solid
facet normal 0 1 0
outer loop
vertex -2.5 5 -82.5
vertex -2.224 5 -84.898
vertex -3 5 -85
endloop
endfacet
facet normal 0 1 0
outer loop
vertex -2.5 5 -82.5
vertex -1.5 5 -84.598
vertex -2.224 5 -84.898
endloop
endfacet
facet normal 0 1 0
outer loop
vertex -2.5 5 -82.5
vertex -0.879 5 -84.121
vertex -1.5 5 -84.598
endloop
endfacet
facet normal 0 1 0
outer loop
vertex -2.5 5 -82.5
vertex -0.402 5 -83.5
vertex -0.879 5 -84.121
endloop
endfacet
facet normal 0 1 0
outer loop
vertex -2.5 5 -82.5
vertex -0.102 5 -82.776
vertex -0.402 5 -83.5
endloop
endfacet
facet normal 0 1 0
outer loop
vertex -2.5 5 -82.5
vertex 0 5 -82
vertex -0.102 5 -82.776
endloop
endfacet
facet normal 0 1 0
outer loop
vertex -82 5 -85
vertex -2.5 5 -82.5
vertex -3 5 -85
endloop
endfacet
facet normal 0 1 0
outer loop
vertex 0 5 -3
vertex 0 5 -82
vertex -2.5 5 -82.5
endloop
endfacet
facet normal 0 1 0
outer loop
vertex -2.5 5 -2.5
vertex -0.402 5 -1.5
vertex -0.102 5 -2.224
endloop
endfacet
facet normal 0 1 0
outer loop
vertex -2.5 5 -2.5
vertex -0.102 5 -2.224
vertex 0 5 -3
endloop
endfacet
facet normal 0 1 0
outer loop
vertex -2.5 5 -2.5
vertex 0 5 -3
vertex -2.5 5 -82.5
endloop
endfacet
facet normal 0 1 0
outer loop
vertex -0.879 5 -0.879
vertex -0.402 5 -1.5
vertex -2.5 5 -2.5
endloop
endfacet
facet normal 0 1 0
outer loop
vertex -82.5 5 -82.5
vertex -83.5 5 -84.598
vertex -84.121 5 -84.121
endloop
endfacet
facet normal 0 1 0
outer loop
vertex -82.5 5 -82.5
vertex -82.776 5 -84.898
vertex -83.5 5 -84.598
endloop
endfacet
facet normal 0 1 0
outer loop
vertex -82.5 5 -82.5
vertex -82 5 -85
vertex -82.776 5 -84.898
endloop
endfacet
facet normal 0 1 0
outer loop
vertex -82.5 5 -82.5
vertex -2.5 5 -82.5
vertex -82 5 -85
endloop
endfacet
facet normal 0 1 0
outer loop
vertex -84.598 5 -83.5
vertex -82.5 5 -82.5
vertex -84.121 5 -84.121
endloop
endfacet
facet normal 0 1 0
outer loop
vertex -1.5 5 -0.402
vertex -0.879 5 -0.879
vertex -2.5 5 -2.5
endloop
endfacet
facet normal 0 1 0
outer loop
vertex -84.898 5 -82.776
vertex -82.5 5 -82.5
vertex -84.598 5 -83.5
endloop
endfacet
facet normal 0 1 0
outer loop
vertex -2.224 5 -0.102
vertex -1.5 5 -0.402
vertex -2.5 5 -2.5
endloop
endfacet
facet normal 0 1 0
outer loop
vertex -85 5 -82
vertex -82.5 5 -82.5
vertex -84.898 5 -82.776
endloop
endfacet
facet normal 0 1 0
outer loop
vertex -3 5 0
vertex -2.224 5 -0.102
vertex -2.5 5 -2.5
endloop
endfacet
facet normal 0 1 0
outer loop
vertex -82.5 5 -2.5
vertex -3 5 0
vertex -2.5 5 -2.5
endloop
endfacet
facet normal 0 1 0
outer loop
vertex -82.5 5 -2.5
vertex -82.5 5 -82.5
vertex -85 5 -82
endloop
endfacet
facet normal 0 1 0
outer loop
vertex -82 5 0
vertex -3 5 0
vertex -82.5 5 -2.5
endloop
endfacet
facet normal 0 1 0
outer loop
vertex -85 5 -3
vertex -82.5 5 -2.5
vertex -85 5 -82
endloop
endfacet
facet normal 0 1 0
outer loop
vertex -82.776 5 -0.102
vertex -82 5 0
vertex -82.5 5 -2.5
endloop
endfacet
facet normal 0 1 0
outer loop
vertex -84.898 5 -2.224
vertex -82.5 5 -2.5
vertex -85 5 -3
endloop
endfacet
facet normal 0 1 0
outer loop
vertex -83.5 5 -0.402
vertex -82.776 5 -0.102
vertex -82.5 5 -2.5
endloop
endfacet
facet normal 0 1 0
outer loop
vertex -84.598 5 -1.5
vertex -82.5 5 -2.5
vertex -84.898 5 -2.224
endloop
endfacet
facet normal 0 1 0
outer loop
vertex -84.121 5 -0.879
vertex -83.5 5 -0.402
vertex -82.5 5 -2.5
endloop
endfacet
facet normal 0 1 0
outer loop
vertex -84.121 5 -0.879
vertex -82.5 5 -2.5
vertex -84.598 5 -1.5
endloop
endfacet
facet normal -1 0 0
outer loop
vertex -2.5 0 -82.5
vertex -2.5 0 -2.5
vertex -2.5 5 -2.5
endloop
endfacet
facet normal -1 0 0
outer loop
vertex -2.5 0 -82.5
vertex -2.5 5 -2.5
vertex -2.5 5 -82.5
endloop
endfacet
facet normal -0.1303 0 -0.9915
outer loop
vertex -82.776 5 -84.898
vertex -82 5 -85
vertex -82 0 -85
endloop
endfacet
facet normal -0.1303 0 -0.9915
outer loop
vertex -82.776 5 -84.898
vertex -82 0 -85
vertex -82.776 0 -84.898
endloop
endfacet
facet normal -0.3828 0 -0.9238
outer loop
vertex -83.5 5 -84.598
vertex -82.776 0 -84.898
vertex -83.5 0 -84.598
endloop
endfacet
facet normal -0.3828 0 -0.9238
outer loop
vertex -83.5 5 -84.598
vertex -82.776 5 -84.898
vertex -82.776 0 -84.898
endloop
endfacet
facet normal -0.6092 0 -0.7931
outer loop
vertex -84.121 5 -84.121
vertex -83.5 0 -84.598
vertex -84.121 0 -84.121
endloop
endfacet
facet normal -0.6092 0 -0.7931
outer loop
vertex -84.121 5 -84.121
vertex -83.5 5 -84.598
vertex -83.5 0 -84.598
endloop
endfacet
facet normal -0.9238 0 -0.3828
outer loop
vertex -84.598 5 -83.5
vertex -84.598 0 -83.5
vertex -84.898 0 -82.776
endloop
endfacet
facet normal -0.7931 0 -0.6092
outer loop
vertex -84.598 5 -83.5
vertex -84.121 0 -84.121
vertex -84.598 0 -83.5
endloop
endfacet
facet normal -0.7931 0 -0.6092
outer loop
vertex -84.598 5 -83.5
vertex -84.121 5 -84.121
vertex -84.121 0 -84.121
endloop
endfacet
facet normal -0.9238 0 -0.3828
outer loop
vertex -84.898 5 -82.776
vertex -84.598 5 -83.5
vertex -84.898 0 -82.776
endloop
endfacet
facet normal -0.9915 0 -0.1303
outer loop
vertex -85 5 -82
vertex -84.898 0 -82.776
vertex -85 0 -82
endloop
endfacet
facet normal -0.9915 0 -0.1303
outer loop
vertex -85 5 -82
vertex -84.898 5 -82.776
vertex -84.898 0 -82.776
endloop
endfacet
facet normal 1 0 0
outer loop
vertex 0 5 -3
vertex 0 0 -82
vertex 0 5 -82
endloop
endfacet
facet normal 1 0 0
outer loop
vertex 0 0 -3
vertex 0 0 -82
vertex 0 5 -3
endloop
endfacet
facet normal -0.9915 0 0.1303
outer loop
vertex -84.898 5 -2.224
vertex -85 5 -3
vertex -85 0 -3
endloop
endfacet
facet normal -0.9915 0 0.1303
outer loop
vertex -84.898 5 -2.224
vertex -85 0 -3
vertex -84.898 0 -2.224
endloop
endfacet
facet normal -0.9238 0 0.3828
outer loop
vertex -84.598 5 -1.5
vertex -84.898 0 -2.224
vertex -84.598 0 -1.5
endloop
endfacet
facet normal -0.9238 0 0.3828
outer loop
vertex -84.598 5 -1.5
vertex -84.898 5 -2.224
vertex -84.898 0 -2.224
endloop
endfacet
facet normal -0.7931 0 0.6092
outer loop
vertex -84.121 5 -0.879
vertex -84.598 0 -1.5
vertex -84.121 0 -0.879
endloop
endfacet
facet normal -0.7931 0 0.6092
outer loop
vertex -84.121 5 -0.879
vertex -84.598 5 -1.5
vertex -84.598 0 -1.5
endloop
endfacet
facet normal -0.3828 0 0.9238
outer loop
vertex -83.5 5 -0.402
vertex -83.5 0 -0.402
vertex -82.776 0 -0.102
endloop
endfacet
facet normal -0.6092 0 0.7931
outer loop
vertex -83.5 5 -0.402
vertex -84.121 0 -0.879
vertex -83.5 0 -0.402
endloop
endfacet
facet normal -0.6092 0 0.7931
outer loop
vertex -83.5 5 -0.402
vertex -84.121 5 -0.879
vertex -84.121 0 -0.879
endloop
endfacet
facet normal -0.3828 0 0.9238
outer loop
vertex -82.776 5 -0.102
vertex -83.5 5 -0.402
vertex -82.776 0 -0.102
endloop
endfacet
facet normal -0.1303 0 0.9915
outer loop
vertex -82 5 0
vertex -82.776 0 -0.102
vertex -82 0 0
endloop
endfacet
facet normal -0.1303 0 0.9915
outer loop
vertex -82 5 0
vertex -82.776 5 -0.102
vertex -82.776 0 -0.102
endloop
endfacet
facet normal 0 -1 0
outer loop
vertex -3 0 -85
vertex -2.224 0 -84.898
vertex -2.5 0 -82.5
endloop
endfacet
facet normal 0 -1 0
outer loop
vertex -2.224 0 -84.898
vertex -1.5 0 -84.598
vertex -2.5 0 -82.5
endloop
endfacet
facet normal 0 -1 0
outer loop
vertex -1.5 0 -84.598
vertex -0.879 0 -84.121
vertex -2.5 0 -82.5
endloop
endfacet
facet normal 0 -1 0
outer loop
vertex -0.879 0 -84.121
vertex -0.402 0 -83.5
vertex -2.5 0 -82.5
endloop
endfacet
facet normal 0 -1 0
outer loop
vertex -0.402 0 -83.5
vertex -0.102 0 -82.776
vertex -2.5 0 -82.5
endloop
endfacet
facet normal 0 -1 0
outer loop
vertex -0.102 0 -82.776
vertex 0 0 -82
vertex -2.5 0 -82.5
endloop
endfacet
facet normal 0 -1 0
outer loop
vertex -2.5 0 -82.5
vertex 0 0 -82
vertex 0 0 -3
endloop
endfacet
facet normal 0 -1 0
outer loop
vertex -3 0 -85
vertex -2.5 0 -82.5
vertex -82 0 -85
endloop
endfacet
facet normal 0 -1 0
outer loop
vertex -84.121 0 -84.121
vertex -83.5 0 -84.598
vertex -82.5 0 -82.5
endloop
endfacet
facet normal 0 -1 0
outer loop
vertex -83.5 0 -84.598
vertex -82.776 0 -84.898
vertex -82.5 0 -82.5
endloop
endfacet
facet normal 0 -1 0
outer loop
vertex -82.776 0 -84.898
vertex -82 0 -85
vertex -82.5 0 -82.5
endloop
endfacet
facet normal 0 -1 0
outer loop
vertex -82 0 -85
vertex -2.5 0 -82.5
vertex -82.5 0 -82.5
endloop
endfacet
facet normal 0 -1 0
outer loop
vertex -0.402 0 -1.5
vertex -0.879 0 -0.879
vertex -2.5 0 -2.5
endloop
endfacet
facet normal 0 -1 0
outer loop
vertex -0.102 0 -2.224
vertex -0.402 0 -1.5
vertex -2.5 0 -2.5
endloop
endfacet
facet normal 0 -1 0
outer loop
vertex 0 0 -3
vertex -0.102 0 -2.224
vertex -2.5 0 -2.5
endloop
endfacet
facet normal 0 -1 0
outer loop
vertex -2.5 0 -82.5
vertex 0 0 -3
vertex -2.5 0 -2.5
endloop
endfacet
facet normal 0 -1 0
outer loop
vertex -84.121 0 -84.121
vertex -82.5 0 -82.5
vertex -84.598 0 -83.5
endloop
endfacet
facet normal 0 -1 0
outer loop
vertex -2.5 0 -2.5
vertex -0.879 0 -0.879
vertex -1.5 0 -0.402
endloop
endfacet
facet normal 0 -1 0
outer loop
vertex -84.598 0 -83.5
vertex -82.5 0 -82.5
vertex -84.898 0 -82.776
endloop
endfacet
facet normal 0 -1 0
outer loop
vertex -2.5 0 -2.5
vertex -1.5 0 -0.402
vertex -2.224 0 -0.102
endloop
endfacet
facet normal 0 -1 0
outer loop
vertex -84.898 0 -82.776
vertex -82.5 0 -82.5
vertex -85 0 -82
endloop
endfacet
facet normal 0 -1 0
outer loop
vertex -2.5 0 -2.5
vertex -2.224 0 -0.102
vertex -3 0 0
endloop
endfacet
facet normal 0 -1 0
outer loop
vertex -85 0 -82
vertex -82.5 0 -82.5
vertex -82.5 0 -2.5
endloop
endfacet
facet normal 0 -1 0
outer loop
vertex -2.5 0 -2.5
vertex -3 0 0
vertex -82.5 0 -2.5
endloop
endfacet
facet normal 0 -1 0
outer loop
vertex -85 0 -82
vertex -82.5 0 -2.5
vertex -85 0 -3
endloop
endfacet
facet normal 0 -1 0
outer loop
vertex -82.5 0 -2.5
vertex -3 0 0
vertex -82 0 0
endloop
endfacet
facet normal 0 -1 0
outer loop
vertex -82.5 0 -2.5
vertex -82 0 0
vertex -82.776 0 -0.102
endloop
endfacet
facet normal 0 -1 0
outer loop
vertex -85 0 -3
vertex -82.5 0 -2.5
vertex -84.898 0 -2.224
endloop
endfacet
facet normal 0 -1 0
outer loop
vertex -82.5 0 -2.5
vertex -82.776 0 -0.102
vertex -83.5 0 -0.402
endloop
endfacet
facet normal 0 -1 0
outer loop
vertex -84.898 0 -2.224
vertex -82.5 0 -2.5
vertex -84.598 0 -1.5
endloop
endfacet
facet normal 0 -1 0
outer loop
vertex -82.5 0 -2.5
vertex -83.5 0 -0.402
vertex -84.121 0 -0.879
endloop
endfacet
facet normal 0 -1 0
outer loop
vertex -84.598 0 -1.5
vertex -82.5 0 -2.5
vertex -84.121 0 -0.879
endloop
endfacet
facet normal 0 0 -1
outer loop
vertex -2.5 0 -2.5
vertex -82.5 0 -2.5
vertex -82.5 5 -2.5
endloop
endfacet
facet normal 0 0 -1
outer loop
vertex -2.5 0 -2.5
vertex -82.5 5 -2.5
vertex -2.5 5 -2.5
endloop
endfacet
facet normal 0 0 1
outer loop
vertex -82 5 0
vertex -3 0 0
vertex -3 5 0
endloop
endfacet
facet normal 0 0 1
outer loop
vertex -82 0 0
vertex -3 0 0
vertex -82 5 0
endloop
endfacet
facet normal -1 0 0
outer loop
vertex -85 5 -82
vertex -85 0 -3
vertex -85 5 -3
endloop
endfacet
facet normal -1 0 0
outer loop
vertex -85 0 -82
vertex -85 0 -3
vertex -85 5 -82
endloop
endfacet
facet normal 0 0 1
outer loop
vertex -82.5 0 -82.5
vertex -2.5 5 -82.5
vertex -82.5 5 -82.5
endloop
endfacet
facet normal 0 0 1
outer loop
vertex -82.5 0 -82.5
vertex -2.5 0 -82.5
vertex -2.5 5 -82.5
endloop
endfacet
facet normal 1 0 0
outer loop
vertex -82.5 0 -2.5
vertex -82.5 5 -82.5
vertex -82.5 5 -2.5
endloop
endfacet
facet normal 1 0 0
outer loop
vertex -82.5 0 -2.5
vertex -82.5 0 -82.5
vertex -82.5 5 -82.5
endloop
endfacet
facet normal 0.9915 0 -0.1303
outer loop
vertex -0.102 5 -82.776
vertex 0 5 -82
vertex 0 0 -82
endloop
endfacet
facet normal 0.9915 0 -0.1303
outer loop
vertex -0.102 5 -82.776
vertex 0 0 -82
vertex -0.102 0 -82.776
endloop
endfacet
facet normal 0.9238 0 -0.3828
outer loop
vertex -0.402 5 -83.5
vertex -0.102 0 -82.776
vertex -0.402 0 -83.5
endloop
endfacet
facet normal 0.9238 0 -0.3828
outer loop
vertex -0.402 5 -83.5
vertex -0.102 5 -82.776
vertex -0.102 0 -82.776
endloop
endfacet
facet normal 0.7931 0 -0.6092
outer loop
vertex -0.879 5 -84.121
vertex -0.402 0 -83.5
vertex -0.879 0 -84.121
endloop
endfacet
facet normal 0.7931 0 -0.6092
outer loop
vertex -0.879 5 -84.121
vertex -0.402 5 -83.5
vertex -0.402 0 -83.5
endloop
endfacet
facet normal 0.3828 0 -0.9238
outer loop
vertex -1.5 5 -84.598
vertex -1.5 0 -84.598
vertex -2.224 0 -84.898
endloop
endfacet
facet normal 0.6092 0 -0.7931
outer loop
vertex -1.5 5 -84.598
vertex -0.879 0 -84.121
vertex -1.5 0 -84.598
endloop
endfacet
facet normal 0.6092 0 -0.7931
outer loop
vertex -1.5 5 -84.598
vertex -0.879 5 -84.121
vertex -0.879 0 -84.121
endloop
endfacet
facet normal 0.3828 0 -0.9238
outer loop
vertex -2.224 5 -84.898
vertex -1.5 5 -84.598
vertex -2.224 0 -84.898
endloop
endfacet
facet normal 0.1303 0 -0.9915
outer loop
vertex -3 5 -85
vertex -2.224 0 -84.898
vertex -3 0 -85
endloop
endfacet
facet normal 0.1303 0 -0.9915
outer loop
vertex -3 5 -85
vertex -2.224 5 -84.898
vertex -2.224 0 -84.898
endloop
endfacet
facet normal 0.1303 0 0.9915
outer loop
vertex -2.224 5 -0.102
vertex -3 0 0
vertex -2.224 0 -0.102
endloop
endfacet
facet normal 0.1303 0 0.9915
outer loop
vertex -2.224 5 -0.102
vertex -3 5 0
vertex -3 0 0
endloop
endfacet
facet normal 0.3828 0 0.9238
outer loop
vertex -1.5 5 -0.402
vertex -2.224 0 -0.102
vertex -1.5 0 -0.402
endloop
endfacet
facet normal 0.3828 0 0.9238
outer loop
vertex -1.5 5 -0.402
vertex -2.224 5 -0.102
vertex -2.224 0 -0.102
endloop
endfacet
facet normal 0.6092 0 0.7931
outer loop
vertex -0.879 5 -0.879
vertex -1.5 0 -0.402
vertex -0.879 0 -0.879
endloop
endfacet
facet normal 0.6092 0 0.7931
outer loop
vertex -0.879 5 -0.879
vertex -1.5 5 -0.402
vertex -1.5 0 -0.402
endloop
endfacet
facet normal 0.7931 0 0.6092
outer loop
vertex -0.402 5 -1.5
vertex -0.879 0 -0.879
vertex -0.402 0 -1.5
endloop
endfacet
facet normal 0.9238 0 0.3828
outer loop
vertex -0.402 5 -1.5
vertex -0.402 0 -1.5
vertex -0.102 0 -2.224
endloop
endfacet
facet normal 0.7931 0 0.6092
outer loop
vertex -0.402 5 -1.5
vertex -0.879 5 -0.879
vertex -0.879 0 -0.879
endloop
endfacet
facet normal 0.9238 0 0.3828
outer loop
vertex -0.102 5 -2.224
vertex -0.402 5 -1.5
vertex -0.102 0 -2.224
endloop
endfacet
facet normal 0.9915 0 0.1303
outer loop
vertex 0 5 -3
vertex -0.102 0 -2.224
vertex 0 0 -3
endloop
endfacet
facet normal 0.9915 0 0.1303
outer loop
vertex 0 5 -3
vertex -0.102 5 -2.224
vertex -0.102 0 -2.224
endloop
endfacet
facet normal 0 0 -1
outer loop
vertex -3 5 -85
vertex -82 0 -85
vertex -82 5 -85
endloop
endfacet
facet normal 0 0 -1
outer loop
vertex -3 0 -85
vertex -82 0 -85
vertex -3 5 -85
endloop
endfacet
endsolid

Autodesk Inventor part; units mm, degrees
ref_plane "YZ Plane" through (0, 0, 0) normal (1, 0, 0) x (0, 1, 0)
ref_plane "XZ Plane" through (0, 0, 0) normal (0, 1, 0) x (-1, 0, 0)
ref_plane "XY Plane" through (0, 0, 0) normal (0, 0, 1) x (1, 0, 0)
sketch "スケッチ1" plane through (0, 0, 0) normal (0, 1, 0) x (-1, 0, 0)
  line L0 (0, 0) -> (85, 0)
  line L1 (85, 0) -> (85, -85)
  line L2 (85, -85) -> (0, -85)
  line L3 (0, -85) -> (0, 0)
  line L4 (82.5, -2.5) -> (2.5, -2.5)
  line L5 (2.5, -2.5) -> (2.5, -82.5)
  line L6 (2.5, -82.5) -> (82.5, -82.5)
  line L7 (82.5, -82.5) -> (82.5, -2.5)
  point P0 (42.5, -2.5)
  point P1 (42.5, 0)
  point P2 (82.5, -42.5)
  point P3 (85, -42.5)
  dimension "d0" = 85
  dimension "d1" = 85
  dimension "d2" = 80
  dimension "d3" = 80
extrude "押し出し1" add sketch "スケッチ1" along normal blind 5
fillet "フィレット1" radius 3 4 edges at (0, 2.5, 0) (-85, 2.5, 0) (-85, 2.5, -85) (0, 2.5, -85)
properties part number "こたつの足_試作"
